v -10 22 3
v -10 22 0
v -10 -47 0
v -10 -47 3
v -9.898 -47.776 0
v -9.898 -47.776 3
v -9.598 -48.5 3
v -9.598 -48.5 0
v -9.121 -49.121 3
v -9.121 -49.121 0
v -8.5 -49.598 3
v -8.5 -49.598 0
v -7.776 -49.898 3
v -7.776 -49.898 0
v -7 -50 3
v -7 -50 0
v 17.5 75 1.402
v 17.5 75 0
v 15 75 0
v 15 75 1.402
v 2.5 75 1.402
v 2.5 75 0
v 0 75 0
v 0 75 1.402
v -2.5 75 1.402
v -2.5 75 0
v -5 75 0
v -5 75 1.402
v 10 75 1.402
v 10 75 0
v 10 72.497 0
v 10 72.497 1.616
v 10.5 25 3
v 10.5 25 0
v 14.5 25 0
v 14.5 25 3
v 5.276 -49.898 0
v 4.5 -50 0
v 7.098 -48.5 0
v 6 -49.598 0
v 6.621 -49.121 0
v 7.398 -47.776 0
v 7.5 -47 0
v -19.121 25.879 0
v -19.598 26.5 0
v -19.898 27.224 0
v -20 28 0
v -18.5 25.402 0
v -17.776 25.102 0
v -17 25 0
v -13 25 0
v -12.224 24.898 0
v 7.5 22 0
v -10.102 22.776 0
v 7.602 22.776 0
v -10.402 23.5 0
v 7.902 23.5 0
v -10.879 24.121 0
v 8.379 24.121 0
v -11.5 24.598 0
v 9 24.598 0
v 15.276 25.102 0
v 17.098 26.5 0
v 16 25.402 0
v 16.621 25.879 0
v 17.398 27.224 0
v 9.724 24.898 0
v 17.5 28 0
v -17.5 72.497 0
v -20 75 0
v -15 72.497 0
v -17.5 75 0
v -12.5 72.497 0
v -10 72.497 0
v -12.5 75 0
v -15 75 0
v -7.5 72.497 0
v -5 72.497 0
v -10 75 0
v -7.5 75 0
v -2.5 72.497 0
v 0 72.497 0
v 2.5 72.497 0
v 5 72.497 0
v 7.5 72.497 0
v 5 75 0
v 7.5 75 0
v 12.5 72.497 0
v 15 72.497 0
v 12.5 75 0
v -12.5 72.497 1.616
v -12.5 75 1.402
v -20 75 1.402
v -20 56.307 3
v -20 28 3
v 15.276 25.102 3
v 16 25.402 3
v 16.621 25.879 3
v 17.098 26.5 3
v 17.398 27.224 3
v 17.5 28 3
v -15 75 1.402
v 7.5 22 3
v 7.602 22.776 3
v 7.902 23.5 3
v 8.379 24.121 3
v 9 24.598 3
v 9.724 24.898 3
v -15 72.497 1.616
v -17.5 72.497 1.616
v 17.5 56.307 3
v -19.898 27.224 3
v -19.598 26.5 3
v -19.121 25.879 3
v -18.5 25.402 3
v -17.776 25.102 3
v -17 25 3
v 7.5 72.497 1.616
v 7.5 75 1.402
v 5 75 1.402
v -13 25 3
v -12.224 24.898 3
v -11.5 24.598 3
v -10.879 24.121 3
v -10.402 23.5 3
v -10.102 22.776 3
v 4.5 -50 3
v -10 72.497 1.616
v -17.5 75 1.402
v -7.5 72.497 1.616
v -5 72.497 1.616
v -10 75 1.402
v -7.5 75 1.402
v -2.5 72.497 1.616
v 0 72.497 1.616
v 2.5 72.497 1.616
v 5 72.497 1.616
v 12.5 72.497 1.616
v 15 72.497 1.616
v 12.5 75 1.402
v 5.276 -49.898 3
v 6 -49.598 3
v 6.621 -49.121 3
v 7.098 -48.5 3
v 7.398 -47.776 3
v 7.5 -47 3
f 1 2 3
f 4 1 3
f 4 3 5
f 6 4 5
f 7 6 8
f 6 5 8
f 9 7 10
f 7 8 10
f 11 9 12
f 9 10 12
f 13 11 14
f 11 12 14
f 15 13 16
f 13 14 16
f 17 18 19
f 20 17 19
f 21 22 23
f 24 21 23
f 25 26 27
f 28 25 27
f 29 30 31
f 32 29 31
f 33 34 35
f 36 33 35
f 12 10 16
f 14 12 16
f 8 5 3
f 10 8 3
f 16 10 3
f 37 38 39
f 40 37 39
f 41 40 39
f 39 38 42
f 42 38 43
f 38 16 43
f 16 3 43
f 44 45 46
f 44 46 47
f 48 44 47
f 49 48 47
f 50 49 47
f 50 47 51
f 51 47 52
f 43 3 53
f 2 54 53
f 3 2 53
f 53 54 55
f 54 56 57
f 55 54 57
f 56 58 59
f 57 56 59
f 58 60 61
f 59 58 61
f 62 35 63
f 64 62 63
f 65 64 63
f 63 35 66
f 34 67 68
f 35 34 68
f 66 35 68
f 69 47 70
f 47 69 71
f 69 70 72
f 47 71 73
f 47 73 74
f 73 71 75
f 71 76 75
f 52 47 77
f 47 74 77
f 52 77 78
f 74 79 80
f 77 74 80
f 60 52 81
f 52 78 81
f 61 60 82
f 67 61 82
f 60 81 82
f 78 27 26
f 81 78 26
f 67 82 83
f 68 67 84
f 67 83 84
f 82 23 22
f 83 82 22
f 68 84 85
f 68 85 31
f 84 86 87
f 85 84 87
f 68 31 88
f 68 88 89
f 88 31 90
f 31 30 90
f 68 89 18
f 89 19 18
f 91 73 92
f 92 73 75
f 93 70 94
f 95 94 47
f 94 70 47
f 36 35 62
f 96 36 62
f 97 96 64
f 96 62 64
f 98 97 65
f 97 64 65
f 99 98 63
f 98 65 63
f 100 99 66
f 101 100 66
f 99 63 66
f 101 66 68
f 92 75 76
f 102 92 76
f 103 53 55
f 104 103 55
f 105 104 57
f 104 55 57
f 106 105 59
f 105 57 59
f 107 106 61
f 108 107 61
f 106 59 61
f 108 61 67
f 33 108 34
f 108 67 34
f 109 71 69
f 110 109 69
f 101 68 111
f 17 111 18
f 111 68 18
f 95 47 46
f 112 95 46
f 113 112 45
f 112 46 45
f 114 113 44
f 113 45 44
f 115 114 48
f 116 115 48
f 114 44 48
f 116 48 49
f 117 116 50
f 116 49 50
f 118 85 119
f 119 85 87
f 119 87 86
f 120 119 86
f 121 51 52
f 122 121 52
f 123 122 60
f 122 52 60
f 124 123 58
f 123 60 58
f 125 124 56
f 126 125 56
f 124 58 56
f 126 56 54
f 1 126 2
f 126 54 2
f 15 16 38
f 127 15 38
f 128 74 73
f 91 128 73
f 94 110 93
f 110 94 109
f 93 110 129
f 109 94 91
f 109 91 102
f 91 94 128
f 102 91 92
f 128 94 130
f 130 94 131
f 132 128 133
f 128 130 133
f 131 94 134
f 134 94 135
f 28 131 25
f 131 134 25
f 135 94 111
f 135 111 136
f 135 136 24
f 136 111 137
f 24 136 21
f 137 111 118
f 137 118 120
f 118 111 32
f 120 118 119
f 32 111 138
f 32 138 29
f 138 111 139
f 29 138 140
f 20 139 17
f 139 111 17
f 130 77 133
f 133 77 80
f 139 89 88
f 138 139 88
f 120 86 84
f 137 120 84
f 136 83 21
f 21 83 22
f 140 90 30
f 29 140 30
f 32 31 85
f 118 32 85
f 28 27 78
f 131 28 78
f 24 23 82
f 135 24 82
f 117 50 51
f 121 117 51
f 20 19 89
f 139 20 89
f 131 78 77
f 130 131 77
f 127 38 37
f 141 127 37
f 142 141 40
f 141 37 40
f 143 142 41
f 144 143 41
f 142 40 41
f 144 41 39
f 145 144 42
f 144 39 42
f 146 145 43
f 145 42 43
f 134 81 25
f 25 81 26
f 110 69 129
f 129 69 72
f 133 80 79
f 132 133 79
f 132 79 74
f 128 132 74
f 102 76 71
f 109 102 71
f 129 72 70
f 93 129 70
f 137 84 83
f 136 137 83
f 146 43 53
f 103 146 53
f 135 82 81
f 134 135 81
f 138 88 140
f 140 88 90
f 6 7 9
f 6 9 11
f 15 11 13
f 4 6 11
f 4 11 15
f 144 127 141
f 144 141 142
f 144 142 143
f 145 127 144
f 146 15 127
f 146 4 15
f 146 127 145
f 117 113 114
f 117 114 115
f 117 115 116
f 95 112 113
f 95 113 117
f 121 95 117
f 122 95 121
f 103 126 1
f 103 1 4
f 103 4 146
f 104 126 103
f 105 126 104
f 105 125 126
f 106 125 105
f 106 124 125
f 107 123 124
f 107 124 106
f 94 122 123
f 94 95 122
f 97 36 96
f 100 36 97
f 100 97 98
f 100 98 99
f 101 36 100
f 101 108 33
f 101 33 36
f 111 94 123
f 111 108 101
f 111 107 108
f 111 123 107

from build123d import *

# Parameters (mm, degrees)
F1_DEPTH = 3
F3_DEPTH = 65


with BuildPart() as f1:
    # F0 (on Top) → F1 (new body)
    with BuildSketch(Plane.XY):
        with BuildLine():
            Line((-17.5, 75), (-20, 75))
            Line((-20, 75), (-20, 72.5))
            Line((-20, 72.5), (-20, 28))
            ThreePointArc((-20, 28), (-19.1213203436, 25.8786796564), (-17, 25))
            Line((-17, 25), (-13, 25))
            ThreePointArc((-13, 25), (-10.8786796564, 24.1213203436), (-10, 22))
            Line((-10, 22), (-10, -47))
            ThreePointArc((-10, -47), (-9.1213203436, -49.1213203436), (-7, -50))
            Line((-7, -50), (-1.25, -50))
            Line((-1.25, -50), (4.5, -50))
            ThreePointArc((4.5, -50), (6.6213203436, -49.1213203436), (7.5, -47))
            Line((7.5, -47), (7.5, 22))
            ThreePointArc((7.5, 22), (8.3786796564, 24.1213203436), (10.5, 25))
            Line((10.5, 25), (14.5, 25))
            ThreePointArc((14.5, 25), (16.6213203436, 25.8786796564), (17.5, 28))
            Line((17.5, 28), (17.5, 75))
            Line((17.5, 75), (15, 75))
            Line((15, 75), (15, 72.4972039461))
            Line((15, 72.4972039461), (12.5, 72.4972039461))
            Line((12.5, 72.4972039461), (12.5, 75))
            Line((12.5, 75), (10, 75))
            Line((10, 75), (10, 72.4972039461))
            Line((10, 72.4972039461), (7.5, 72.4972039461))
            Line((7.5, 72.4972039461), (7.5, 75))
            Line((7.5, 75), (5, 75))
            Line((5, 75), (5, 72.4972039461))
            Line((5, 72.4972039461), (2.5, 72.4972039461))
            Line((2.5, 72.4972039461), (2.5, 75))
            Line((2.5, 75), (0, 75))
            Line((0, 75), (0, 72.4972039461))
            Line((0, 72.4972039461), (-1.25, 72.4972039461))
            Line((-1.25, 72.4972039461), (-2.5, 72.4972039461))
            Line((-2.5, 72.4972039461), (-2.5, 75))
            Line((-2.5, 75), (-5, 75))
            Line((-5, 75), (-5, 72.4972039461))
            Line((-5, 72.4972039461), (-7.5, 72.4972039461))
            Line((-7.5, 72.4972039461), (-7.5, 75))
            Line((-7.5, 75), (-10, 75))
            Line((-10, 75), (-10, 72.4972039461))
            Line((-10, 72.4972039461), (-12.5, 72.4972039461))
            Line((-12.5, 72.4972039461), (-12.5, 75))
            Line((-12.5, 75), (-15, 75))
            Line((-15, 75), (-15, 72.4972039461))
            Line((-15, 72.4972039461), (-17.5, 72.4972039461))
            Line((-17.5, 72.4972039461), (-17.5, 72.5))
            Line((-17.5, 72.5), (-17.5, 75))
        make_face()
    extrude(amount=F1_DEPTH)

    # F2 (on face) → F3 (cut)
    with BuildSketch(Plane.YZ.offset(17.5)):
        Polygon((75, 1.402389338), (78.919917345, 1.0673716897), (79.0749490261, 6.6061792895), (41.3183644414, 4.2810067534), (56.3069497208, 3), (75, 3), align=None)
        Polygon((56.3069497208, 3), (75, 1.402389338), (75, 3), align=None)
    extrude(amount=-F3_DEPTH, mode=Mode.SUBTRACT)


solid = f1.part
